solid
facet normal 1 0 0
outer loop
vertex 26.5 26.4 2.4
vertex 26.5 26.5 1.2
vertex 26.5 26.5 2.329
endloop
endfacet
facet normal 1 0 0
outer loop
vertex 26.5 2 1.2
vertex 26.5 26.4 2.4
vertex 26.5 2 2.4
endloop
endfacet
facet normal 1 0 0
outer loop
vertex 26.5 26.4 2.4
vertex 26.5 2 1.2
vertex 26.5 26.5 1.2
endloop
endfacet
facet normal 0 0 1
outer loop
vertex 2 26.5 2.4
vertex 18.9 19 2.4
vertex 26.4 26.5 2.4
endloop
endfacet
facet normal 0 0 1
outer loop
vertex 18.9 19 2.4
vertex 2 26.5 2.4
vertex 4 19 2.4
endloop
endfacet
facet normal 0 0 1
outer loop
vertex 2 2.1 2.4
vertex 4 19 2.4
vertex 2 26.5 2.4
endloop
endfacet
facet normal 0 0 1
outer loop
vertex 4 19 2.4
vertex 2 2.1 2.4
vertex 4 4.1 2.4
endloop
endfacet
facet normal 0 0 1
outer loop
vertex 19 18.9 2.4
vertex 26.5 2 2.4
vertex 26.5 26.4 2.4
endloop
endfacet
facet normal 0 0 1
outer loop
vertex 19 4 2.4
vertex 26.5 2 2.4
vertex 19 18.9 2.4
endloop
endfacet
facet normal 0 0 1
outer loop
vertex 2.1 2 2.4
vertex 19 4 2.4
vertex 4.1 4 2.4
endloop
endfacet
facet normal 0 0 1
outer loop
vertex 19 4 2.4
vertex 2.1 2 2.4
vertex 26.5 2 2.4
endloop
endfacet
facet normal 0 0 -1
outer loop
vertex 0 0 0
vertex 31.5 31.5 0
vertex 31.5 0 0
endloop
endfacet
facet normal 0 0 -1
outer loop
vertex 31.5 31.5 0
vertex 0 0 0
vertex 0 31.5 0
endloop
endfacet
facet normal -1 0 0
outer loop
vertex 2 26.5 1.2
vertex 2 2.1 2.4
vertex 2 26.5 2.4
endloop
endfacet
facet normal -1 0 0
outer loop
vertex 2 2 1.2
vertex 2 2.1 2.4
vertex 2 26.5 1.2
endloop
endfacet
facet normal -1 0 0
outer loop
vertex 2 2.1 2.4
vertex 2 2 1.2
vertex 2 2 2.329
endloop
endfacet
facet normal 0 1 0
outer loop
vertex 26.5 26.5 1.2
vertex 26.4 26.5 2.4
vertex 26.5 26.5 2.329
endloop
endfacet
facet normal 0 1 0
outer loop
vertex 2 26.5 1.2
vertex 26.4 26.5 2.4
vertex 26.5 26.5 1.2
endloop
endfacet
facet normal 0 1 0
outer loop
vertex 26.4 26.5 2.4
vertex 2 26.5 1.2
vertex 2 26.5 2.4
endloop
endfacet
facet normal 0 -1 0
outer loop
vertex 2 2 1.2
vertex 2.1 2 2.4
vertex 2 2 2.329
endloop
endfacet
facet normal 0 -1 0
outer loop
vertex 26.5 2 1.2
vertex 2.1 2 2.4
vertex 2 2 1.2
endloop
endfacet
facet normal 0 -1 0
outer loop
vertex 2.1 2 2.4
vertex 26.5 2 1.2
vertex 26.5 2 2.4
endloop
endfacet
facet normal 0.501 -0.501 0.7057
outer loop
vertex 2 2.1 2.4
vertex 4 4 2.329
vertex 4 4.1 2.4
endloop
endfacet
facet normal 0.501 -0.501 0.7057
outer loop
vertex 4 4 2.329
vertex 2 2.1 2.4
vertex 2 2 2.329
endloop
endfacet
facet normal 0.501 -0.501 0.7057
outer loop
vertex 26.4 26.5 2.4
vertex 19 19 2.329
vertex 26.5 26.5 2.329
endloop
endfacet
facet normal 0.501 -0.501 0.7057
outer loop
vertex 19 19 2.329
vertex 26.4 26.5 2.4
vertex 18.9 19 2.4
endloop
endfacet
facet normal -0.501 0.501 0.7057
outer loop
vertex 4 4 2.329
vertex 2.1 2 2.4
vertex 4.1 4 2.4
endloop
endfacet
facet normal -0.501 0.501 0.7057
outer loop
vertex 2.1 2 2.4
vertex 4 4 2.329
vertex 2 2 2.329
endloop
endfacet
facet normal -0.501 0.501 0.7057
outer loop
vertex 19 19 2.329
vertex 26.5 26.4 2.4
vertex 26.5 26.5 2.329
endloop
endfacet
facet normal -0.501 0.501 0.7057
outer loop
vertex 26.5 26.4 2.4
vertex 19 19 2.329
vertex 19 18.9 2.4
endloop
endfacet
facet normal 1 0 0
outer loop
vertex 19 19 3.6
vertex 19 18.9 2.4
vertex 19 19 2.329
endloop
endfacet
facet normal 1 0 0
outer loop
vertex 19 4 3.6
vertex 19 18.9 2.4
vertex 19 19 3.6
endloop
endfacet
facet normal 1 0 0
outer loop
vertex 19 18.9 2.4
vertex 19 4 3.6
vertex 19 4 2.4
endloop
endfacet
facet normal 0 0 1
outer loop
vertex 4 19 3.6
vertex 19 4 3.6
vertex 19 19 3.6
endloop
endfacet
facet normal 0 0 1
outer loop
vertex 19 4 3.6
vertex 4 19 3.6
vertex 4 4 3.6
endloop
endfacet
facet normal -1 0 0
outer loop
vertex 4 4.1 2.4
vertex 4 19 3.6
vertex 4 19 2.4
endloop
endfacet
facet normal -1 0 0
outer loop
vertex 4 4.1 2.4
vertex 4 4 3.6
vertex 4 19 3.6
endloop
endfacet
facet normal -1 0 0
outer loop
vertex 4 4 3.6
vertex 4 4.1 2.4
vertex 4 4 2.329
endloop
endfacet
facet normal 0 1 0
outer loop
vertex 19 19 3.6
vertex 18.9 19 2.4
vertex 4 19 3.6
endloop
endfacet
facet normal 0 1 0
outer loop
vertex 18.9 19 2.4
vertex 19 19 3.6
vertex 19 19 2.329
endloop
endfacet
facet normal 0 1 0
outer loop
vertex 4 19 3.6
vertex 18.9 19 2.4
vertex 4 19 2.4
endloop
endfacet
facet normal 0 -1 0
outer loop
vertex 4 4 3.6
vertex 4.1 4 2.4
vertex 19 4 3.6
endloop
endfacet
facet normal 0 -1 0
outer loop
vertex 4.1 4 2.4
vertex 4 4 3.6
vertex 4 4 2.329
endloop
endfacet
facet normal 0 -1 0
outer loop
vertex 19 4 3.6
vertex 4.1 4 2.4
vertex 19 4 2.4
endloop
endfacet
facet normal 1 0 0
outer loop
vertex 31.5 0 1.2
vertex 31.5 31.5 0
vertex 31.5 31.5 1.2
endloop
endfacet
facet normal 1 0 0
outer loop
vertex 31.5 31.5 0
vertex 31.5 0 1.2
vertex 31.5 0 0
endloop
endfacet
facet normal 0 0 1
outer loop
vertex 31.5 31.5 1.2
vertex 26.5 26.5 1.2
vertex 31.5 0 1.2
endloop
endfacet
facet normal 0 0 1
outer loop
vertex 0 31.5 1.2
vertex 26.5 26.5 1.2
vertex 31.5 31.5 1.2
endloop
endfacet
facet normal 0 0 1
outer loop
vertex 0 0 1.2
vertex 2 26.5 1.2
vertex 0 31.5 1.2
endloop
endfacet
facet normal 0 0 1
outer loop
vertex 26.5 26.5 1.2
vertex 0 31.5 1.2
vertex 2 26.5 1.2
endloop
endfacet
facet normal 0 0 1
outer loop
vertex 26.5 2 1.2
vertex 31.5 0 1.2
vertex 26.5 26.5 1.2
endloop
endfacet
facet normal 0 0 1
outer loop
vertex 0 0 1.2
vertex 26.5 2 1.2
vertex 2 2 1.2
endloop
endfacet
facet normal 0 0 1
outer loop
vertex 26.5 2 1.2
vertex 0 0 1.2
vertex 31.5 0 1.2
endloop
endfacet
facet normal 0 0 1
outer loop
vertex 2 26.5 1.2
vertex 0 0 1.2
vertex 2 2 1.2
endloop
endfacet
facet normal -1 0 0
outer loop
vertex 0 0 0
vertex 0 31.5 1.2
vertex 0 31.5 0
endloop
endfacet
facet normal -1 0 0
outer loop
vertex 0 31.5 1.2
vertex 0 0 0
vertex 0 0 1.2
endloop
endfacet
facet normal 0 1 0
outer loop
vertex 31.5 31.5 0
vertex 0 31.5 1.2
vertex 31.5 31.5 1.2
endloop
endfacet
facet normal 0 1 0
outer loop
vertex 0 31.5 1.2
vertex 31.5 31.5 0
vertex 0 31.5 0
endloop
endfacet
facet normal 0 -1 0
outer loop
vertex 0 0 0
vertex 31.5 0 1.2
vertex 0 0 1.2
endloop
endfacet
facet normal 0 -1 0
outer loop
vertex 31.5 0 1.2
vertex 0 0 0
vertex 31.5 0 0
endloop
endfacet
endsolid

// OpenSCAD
// Flush volume test swatch with stepped squares and a groove cut.

// ---------- Public parameters (mm) ----------
top_square_width = 15;
step_height = 1.2;
second_step_width = 7.5;
first_step_width = 5;
small_step_width = 2;
groove_depth = 0.1;

// ---------- Derived ----------
middle_square_width = top_square_width + second_step_width + small_step_width;
bottom_square_width = middle_square_width + first_step_width + small_step_width;

bottom_square_height = step_height;
middle_square_height = 2 * step_height;
top_square_height = 3 * step_height;

union () {
    translate([2 * small_step_width, 2 * small_step_width, 0]) cube([top_square_width, top_square_width, top_square_height]);
    difference () {
        translate([small_step_width, small_step_width, 0])cube([middle_square_width, middle_square_width, middle_square_height]);
        translate([0, 0, middle_square_height]) rotate([0, 0, 45]) rotate([45, 0, 0]) cube([4 * middle_square_width, groove_depth, groove_depth], center = true);
    }
    cube([bottom_square_width, bottom_square_width, bottom_square_height]);
}
